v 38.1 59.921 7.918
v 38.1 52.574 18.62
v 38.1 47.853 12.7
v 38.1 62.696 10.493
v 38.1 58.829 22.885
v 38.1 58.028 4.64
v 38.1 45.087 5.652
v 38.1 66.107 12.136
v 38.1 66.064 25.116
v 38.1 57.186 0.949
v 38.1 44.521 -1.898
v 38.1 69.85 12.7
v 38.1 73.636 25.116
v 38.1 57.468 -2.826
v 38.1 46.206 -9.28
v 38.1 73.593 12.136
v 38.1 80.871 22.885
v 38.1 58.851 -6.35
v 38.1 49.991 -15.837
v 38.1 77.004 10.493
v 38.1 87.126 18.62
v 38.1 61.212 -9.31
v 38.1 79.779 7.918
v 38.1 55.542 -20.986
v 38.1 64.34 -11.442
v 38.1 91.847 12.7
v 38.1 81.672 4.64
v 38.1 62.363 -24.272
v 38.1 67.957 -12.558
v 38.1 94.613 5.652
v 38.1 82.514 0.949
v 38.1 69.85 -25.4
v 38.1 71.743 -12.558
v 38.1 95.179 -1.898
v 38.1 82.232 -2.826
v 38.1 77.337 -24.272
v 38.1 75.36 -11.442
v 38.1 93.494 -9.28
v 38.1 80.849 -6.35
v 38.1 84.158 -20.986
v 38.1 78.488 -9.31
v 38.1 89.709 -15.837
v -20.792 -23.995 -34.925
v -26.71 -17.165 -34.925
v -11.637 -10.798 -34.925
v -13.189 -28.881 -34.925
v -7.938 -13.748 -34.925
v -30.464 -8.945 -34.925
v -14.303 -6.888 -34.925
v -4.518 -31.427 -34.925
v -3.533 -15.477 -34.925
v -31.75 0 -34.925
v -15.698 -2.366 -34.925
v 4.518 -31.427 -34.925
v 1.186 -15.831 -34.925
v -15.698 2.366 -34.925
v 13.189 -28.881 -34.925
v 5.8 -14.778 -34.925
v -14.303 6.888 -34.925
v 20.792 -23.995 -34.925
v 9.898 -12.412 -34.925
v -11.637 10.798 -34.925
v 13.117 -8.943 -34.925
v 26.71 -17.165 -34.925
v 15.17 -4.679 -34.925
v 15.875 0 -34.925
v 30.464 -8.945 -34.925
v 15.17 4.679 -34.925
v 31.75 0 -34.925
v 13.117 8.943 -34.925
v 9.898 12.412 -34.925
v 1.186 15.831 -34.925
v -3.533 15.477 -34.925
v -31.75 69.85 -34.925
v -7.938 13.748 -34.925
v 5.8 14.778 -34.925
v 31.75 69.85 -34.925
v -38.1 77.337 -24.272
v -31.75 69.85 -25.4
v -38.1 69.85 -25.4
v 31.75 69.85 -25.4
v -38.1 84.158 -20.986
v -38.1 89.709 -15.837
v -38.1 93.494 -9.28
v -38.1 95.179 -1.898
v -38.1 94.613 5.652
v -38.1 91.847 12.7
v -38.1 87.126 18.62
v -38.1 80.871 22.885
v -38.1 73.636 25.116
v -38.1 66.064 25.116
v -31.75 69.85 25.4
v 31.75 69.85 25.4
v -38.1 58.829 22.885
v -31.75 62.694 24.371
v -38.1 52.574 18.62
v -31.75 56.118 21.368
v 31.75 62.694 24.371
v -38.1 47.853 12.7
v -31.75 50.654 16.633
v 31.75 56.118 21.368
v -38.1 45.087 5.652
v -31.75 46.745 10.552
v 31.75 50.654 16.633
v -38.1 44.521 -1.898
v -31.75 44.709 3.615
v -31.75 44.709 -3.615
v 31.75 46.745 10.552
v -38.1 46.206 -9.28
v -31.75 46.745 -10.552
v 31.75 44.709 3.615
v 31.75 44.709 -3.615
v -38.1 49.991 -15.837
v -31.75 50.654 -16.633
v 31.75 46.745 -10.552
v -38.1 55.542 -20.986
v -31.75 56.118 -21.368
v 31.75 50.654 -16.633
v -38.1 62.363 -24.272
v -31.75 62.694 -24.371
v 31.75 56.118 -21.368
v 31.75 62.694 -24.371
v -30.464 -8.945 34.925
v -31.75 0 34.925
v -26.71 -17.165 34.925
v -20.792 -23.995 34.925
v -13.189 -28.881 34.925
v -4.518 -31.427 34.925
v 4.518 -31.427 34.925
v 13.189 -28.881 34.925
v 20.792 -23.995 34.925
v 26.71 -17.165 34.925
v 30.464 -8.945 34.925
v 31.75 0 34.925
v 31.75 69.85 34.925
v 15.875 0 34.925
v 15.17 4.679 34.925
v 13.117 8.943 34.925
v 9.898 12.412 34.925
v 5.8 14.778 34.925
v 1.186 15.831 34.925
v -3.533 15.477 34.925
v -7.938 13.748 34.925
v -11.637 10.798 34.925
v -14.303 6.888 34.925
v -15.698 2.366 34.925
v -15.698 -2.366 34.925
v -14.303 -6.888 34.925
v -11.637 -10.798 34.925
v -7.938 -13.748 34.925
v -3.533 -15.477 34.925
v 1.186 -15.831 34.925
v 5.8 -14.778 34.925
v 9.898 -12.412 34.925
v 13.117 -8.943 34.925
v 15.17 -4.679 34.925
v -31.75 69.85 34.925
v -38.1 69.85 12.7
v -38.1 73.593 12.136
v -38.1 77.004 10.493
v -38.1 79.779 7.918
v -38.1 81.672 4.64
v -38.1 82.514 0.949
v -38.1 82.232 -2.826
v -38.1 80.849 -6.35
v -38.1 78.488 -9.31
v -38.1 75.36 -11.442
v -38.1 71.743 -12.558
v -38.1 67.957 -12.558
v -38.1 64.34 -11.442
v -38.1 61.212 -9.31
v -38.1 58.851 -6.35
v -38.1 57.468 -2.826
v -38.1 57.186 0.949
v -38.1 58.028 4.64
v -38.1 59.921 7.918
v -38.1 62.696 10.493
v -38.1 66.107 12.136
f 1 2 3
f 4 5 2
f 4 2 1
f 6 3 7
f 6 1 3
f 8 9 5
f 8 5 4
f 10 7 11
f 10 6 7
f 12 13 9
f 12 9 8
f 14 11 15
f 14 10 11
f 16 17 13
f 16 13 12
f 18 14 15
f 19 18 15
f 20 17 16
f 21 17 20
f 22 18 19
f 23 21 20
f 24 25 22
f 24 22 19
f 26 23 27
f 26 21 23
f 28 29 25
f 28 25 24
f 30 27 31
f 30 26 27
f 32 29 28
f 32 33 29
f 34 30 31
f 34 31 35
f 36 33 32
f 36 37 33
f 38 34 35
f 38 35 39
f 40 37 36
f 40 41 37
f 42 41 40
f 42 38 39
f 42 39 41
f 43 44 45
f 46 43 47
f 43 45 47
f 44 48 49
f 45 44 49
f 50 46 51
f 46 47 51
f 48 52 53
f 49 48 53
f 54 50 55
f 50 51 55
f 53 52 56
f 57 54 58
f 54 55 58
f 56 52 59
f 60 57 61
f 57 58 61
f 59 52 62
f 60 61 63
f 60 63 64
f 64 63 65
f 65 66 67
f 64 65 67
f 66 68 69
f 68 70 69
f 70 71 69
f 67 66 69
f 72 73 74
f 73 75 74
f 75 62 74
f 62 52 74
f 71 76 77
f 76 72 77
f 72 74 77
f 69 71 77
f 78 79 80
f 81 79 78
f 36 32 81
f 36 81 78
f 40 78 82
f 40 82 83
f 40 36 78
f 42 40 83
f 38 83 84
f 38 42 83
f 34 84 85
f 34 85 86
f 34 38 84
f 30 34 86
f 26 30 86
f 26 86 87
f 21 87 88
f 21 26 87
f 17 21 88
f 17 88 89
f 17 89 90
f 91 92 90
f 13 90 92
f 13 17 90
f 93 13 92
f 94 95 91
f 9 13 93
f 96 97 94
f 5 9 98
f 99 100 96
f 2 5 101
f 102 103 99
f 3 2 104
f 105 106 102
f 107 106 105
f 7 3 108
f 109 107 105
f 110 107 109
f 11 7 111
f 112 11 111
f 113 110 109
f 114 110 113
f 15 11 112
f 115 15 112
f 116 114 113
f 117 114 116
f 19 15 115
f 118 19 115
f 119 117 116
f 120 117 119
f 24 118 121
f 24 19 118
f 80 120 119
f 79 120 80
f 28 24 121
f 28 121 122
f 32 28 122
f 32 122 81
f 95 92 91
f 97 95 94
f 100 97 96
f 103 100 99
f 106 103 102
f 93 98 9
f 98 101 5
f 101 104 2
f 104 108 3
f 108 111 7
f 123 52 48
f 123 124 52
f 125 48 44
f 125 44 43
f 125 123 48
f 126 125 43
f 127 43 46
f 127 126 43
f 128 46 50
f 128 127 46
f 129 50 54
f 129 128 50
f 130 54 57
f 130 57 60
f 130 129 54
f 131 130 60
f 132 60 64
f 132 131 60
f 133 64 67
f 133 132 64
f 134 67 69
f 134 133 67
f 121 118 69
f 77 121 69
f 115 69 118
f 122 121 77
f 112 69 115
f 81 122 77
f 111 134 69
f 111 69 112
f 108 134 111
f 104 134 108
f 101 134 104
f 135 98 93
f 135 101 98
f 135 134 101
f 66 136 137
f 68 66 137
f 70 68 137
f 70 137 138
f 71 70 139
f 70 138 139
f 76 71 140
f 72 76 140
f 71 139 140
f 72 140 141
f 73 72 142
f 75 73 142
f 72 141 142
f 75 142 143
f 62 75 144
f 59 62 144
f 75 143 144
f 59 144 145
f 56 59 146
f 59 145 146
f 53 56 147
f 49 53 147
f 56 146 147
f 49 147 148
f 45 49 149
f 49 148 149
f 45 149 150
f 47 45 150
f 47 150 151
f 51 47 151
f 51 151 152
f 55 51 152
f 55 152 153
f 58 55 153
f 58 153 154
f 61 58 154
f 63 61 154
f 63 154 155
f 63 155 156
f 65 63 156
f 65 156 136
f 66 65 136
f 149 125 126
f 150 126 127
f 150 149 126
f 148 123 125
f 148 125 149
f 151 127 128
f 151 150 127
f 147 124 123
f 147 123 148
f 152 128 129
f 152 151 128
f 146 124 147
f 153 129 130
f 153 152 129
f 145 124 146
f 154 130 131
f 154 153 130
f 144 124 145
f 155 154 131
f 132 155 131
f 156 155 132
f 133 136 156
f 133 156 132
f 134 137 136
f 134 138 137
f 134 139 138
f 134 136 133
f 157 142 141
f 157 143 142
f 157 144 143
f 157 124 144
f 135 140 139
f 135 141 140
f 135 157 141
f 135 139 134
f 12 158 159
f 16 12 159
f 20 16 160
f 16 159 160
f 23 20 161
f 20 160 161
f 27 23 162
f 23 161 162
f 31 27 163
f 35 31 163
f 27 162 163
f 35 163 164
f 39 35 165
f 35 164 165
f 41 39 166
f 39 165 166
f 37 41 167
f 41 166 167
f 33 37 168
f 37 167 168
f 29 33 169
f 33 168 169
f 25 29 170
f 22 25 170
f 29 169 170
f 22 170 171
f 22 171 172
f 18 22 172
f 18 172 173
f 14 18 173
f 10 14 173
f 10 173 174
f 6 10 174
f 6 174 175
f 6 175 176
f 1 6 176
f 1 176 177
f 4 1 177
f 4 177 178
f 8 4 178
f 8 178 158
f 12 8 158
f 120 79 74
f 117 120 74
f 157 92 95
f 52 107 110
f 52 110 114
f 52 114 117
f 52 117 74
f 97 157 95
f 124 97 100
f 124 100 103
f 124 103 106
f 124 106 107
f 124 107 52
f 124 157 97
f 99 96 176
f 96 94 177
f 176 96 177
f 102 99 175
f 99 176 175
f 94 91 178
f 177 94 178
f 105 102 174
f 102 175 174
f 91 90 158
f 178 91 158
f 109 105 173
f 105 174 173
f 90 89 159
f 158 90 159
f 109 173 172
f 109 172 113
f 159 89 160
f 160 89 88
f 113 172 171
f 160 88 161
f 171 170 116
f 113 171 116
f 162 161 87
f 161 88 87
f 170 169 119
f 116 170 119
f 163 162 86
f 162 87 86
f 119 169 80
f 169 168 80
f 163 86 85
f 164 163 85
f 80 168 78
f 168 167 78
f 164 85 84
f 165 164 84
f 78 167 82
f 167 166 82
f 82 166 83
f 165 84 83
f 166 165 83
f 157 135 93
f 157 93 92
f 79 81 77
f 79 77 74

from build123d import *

# Parameters (mm, degrees)
SKETCH1_R                  = 31.75
BOSS_EXTRUDE1_DEPTH        = 34.925
SKETCH3_R                  = 25.4
BOSS_EXTRUDE2_DEPTH        = 38.1
F_97_1_DIAMETER_HOLE1_D    = 25.4
F_97_1_25_DIAMETER_HOLE1_D = 31.75


with BuildPart() as part:
    # Sketch1 → Boss-Extrude1 (new body, symmetric)
    with BuildSketch(Plane.XY):
        with BuildLine():
            ThreePointArc((-31.75, 0), (0, 31.75), (31.75, 0))
            Line((31.75, 0), (31.75, 69.85))
            Line((31.75, 69.85), (-31.75, 69.85))
            Line((-31.75, 69.85), (-31.75, 0))
        make_face()
        Circle(SKETCH1_R)
    extrude(amount=BOSS_EXTRUDE1_DEPTH, both=True)

    # Sketch3 → Boss-Extrude2 (add, symmetric)
    with BuildSketch(Plane(origin=(0, 0, 0), x_dir=(0, 0, -1), z_dir=(1, 0, 0))):
        with Locations((0, 69.85)):
            Circle(SKETCH3_R)
    extrude(amount=BOSS_EXTRUDE2_DEPTH, both=True)

    # #97 (1) Diameter Hole1 (through all)
    with Locations(Plane(origin=(38.1, 0, 0), x_dir=(0, 0, -1), z_dir=(1, 0, 0))):
        with Locations((0, 69.85)):
            Hole(F_97_1_DIAMETER_HOLE1_D / 2)

    # #97 (1.25) Diameter Hole1 (through all)
    with Locations(Plane(origin=(0, 0, -34.925), x_dir=(-1, 0, 0), z_dir=(0, 0, -1))):
        with Locations((0, 0)):
            Hole(F_97_1_25_DIAMETER_HOLE1_D / 2)


solid = part.part
